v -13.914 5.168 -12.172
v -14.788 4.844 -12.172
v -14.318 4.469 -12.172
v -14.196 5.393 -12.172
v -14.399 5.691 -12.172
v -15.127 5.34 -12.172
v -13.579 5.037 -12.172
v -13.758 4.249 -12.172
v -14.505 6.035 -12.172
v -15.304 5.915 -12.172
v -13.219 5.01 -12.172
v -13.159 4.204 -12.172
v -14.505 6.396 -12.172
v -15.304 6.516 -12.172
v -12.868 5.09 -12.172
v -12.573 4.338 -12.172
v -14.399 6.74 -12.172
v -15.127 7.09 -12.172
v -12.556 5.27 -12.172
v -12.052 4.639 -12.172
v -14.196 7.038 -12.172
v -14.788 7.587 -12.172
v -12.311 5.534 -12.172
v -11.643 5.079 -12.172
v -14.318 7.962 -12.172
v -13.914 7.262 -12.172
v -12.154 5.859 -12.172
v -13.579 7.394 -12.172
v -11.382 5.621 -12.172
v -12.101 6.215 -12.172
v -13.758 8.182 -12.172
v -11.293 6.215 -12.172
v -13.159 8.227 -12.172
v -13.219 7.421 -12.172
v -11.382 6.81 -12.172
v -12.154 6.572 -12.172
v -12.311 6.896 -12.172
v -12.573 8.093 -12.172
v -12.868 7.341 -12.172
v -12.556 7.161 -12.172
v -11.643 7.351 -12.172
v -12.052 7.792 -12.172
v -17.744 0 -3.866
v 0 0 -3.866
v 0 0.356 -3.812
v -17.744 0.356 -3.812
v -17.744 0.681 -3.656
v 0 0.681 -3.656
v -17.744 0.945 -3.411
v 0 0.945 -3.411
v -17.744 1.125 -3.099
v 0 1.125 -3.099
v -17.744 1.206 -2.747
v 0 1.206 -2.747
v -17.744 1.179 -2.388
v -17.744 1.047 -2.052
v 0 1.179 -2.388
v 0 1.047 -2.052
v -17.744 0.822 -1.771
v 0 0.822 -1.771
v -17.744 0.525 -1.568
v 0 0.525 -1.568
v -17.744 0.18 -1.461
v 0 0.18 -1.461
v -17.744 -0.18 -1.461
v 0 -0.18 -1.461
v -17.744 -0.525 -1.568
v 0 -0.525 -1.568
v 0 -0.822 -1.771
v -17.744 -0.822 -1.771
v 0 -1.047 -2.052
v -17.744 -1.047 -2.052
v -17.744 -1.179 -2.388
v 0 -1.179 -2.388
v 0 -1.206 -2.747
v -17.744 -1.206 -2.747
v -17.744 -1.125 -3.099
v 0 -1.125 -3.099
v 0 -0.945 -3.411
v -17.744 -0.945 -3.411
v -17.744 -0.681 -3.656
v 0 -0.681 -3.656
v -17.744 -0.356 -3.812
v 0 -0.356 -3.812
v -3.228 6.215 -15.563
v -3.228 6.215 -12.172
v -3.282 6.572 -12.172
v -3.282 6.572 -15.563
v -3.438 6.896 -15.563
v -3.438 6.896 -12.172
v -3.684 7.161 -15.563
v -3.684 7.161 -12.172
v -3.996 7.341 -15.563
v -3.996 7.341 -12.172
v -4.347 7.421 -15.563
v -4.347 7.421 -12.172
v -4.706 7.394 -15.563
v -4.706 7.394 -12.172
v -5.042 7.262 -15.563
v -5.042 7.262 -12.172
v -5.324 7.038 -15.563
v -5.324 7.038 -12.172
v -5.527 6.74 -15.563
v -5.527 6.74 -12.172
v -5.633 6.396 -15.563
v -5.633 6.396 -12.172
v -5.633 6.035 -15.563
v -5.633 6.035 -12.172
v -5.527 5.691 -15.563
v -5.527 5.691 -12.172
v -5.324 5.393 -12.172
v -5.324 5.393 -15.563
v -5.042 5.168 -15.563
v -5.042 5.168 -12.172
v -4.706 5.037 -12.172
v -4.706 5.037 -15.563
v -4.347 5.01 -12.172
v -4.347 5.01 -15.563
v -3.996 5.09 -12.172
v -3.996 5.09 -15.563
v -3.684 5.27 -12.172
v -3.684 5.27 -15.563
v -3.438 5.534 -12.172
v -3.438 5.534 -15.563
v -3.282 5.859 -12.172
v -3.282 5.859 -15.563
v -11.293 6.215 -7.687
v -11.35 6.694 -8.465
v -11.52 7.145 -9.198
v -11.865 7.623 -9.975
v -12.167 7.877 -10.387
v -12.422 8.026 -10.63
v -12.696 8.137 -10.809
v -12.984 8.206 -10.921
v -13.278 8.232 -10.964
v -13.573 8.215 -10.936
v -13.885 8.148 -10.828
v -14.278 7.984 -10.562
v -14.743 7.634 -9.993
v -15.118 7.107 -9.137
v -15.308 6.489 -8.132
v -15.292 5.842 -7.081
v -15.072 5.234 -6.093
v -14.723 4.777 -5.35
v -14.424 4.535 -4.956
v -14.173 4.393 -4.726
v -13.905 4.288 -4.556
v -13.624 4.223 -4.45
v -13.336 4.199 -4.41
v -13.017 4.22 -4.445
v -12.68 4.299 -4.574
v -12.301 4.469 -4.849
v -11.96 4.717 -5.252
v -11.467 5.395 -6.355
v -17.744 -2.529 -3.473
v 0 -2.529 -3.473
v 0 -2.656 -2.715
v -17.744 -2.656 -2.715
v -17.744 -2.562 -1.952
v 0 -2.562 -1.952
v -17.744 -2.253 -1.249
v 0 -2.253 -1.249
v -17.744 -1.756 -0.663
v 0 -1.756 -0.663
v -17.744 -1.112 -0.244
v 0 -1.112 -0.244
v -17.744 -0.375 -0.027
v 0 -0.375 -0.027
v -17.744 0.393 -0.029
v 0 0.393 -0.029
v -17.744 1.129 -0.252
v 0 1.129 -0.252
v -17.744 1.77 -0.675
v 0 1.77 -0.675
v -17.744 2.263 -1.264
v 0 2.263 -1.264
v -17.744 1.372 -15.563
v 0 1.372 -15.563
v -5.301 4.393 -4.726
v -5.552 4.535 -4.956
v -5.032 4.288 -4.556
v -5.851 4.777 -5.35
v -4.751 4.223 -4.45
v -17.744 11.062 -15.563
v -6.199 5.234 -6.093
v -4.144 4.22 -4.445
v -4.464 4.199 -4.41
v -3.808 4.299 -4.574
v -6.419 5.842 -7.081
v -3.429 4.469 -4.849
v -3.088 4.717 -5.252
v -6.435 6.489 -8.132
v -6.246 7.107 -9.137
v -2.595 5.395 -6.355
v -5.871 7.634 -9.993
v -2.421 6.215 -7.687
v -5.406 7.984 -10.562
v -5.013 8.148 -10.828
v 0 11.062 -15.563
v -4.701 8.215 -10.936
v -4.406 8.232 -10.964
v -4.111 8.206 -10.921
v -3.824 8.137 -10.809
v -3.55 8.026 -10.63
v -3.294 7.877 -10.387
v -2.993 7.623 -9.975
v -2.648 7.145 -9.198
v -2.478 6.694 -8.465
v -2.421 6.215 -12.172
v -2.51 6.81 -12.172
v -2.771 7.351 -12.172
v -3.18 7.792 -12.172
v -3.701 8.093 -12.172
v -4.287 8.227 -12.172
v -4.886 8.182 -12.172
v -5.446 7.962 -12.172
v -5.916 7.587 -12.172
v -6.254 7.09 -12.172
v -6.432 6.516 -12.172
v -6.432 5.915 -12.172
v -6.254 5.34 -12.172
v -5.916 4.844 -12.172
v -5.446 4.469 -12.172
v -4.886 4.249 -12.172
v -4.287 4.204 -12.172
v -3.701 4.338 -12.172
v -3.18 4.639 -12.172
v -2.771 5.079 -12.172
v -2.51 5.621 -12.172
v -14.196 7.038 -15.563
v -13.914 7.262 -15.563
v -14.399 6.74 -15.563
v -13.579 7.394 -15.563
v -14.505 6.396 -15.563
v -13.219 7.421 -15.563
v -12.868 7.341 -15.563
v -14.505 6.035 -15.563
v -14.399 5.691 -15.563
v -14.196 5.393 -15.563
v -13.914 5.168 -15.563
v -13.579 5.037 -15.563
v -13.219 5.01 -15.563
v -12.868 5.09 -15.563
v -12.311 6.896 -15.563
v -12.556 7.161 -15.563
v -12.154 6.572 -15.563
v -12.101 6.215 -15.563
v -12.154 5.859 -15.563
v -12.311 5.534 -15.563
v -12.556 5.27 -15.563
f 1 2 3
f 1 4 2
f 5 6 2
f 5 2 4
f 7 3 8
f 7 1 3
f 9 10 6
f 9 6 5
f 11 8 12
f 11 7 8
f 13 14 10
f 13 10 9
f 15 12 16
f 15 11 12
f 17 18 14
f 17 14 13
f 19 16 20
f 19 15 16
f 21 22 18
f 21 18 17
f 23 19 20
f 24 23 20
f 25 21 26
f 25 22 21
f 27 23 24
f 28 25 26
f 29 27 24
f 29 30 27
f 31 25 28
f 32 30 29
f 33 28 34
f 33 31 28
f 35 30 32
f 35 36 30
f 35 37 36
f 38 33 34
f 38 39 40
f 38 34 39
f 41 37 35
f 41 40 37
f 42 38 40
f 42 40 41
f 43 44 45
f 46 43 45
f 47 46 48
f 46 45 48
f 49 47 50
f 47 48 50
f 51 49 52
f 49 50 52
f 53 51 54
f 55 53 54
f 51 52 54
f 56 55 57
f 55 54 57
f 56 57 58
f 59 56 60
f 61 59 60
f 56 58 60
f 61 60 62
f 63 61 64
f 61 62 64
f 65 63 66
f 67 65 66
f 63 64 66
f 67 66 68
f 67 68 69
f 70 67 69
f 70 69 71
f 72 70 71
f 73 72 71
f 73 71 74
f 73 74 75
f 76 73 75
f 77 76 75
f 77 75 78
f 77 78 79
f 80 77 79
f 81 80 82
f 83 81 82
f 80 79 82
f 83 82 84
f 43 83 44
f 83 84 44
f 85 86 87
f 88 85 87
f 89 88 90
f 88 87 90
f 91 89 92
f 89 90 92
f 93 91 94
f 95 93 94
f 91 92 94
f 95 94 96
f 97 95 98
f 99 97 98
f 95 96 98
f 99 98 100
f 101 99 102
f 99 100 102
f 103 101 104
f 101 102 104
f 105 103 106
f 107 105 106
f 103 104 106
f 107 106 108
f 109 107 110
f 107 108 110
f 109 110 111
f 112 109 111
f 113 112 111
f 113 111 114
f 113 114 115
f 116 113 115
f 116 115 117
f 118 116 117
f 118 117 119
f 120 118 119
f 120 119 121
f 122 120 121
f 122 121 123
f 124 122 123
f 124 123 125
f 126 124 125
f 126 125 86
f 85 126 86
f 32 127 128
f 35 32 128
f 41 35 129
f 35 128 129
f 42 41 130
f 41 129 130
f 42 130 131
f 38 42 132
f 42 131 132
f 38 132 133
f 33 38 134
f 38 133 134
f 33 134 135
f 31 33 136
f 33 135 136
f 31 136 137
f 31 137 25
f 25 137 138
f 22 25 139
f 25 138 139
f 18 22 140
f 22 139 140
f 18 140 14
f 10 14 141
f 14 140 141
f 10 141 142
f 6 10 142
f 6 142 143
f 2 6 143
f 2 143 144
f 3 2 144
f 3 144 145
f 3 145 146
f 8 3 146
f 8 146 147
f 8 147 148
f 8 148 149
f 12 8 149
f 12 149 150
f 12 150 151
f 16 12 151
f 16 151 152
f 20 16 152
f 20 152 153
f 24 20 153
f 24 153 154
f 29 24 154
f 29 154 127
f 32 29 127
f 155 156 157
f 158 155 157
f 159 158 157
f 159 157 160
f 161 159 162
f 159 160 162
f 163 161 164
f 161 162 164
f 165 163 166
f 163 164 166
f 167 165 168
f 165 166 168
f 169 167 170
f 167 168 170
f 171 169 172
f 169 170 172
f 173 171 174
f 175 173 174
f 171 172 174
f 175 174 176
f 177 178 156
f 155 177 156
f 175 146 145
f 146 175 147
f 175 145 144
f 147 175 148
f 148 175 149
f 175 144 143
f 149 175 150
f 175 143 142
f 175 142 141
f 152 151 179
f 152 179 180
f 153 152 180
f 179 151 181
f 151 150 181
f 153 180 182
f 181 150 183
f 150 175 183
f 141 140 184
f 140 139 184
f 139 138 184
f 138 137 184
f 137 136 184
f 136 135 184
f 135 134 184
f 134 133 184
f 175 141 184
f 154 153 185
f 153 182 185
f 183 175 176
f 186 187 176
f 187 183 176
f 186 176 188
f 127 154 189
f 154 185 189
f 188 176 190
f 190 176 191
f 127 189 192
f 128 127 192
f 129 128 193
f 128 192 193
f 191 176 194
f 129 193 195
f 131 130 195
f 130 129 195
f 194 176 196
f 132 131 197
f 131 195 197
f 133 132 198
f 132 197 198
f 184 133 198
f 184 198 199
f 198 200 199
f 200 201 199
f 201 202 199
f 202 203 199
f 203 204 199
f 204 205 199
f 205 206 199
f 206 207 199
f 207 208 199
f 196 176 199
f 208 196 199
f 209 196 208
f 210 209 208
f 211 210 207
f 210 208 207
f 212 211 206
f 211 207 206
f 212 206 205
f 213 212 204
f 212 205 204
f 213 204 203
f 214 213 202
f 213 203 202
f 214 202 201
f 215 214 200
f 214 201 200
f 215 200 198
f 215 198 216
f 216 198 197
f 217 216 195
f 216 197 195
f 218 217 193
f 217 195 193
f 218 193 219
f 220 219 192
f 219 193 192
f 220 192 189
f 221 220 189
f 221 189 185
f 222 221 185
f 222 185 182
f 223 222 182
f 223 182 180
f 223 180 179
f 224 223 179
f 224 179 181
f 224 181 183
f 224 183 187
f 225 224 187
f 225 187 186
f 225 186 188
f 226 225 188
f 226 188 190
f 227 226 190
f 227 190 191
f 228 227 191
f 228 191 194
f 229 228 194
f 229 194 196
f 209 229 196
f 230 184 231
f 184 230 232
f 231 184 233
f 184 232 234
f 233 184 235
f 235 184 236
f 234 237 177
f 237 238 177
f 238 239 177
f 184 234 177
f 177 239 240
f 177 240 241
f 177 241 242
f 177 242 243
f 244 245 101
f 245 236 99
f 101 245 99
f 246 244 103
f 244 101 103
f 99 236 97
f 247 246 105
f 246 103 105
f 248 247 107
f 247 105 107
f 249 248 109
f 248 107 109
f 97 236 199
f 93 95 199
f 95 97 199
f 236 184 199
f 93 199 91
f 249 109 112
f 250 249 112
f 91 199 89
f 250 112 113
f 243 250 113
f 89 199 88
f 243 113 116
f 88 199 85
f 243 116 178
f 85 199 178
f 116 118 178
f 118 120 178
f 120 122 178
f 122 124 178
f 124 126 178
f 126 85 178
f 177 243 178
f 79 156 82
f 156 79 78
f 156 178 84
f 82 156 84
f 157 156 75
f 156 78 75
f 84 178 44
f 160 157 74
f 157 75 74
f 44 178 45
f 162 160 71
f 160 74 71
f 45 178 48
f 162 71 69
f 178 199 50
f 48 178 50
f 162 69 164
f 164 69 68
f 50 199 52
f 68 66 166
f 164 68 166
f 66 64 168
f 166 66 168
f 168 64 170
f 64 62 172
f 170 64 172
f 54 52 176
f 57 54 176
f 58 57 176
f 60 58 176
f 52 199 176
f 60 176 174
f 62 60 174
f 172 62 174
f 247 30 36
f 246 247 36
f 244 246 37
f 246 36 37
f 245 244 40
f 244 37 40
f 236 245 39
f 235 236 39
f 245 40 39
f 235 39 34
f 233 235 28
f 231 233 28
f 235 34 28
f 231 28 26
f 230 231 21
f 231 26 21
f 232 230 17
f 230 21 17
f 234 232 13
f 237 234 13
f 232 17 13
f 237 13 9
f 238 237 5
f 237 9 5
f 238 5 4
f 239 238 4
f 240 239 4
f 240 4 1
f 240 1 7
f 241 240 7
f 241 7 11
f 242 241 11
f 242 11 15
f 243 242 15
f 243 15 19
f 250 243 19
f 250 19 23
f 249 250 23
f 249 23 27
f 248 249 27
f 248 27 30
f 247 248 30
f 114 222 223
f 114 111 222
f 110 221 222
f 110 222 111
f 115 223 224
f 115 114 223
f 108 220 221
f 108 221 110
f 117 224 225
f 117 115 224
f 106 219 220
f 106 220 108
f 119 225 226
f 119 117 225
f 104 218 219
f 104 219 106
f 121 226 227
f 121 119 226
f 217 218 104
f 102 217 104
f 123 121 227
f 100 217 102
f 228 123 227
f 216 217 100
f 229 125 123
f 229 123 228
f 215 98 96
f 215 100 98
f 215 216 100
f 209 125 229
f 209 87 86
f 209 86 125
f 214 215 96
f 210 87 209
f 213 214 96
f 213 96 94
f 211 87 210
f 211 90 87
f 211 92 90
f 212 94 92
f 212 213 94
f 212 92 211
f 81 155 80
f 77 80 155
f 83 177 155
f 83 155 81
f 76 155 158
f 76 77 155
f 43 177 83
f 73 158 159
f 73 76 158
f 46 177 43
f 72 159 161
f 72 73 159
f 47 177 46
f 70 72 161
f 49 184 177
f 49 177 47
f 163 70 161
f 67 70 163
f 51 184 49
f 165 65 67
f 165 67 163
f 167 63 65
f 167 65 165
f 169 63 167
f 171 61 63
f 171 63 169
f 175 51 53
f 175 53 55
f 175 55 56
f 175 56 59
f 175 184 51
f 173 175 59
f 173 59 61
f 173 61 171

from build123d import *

# Parameters (mm, degrees)
SKETCH1_R           = 1.20904
BOSS_EXTRUDE1_DEPTH = 17.74444
SKETCH5_R           = 2.01676
CUT_EXTRUDE5_DEPTH  = 12.17243946
SKETCH6_R           = 1.20904
CUT_EXTRUDE6_DEPTH  = 4.39014054


with BuildPart() as part:
    # Sketch1 → Boss-Extrude1 (new body)
    with BuildSketch(Plane(origin=(0, 0, 0), x_dir=(0, 0, -1), z_dir=(1, 0, 0))):
        with BuildLine():
            Line((15.56258, 11.0617), (15.56258, 1.3716))
            Line((15.56258, 1.3716), (3.472518261, -2.528530751))
            ThreePointArc((3.472518261, -2.528530751), (0.243922332, -1.11203737), (1.264385716, 2.262712941))
            Line((1.264385716, 2.262712941), (15.56258, 11.0617))
        make_face()
        with Locations((2.65684, 0)):
            Circle(SKETCH1_R, mode=Mode.SUBTRACT)
    extrude(amount=-BOSS_EXTRUDE1_DEPTH)

    # Sketch5 → Cut-Extrude5 (cut)
    with BuildSketch(Plane.XY):
        with Locations((-13.3096, 6.21538)):
            Circle(SKETCH5_R)
        with Locations((-4.43738, 6.21538)):
            Circle(SKETCH5_R)
    extrude(amount=-CUT_EXTRUDE5_DEPTH, mode=Mode.SUBTRACT)

    # Sketch6 → Cut-Extrude6 (cut, through all)
    with BuildSketch(Plane.XY.offset(-12.17243946)):
        with Locations((-13.3096, 6.21538)):
            Circle(SKETCH6_R)
        with Locations((-4.43738, 6.21538)):
            Circle(SKETCH6_R)
    extrude(amount=-CUT_EXTRUDE6_DEPTH, mode=Mode.SUBTRACT)


solid = part.part
